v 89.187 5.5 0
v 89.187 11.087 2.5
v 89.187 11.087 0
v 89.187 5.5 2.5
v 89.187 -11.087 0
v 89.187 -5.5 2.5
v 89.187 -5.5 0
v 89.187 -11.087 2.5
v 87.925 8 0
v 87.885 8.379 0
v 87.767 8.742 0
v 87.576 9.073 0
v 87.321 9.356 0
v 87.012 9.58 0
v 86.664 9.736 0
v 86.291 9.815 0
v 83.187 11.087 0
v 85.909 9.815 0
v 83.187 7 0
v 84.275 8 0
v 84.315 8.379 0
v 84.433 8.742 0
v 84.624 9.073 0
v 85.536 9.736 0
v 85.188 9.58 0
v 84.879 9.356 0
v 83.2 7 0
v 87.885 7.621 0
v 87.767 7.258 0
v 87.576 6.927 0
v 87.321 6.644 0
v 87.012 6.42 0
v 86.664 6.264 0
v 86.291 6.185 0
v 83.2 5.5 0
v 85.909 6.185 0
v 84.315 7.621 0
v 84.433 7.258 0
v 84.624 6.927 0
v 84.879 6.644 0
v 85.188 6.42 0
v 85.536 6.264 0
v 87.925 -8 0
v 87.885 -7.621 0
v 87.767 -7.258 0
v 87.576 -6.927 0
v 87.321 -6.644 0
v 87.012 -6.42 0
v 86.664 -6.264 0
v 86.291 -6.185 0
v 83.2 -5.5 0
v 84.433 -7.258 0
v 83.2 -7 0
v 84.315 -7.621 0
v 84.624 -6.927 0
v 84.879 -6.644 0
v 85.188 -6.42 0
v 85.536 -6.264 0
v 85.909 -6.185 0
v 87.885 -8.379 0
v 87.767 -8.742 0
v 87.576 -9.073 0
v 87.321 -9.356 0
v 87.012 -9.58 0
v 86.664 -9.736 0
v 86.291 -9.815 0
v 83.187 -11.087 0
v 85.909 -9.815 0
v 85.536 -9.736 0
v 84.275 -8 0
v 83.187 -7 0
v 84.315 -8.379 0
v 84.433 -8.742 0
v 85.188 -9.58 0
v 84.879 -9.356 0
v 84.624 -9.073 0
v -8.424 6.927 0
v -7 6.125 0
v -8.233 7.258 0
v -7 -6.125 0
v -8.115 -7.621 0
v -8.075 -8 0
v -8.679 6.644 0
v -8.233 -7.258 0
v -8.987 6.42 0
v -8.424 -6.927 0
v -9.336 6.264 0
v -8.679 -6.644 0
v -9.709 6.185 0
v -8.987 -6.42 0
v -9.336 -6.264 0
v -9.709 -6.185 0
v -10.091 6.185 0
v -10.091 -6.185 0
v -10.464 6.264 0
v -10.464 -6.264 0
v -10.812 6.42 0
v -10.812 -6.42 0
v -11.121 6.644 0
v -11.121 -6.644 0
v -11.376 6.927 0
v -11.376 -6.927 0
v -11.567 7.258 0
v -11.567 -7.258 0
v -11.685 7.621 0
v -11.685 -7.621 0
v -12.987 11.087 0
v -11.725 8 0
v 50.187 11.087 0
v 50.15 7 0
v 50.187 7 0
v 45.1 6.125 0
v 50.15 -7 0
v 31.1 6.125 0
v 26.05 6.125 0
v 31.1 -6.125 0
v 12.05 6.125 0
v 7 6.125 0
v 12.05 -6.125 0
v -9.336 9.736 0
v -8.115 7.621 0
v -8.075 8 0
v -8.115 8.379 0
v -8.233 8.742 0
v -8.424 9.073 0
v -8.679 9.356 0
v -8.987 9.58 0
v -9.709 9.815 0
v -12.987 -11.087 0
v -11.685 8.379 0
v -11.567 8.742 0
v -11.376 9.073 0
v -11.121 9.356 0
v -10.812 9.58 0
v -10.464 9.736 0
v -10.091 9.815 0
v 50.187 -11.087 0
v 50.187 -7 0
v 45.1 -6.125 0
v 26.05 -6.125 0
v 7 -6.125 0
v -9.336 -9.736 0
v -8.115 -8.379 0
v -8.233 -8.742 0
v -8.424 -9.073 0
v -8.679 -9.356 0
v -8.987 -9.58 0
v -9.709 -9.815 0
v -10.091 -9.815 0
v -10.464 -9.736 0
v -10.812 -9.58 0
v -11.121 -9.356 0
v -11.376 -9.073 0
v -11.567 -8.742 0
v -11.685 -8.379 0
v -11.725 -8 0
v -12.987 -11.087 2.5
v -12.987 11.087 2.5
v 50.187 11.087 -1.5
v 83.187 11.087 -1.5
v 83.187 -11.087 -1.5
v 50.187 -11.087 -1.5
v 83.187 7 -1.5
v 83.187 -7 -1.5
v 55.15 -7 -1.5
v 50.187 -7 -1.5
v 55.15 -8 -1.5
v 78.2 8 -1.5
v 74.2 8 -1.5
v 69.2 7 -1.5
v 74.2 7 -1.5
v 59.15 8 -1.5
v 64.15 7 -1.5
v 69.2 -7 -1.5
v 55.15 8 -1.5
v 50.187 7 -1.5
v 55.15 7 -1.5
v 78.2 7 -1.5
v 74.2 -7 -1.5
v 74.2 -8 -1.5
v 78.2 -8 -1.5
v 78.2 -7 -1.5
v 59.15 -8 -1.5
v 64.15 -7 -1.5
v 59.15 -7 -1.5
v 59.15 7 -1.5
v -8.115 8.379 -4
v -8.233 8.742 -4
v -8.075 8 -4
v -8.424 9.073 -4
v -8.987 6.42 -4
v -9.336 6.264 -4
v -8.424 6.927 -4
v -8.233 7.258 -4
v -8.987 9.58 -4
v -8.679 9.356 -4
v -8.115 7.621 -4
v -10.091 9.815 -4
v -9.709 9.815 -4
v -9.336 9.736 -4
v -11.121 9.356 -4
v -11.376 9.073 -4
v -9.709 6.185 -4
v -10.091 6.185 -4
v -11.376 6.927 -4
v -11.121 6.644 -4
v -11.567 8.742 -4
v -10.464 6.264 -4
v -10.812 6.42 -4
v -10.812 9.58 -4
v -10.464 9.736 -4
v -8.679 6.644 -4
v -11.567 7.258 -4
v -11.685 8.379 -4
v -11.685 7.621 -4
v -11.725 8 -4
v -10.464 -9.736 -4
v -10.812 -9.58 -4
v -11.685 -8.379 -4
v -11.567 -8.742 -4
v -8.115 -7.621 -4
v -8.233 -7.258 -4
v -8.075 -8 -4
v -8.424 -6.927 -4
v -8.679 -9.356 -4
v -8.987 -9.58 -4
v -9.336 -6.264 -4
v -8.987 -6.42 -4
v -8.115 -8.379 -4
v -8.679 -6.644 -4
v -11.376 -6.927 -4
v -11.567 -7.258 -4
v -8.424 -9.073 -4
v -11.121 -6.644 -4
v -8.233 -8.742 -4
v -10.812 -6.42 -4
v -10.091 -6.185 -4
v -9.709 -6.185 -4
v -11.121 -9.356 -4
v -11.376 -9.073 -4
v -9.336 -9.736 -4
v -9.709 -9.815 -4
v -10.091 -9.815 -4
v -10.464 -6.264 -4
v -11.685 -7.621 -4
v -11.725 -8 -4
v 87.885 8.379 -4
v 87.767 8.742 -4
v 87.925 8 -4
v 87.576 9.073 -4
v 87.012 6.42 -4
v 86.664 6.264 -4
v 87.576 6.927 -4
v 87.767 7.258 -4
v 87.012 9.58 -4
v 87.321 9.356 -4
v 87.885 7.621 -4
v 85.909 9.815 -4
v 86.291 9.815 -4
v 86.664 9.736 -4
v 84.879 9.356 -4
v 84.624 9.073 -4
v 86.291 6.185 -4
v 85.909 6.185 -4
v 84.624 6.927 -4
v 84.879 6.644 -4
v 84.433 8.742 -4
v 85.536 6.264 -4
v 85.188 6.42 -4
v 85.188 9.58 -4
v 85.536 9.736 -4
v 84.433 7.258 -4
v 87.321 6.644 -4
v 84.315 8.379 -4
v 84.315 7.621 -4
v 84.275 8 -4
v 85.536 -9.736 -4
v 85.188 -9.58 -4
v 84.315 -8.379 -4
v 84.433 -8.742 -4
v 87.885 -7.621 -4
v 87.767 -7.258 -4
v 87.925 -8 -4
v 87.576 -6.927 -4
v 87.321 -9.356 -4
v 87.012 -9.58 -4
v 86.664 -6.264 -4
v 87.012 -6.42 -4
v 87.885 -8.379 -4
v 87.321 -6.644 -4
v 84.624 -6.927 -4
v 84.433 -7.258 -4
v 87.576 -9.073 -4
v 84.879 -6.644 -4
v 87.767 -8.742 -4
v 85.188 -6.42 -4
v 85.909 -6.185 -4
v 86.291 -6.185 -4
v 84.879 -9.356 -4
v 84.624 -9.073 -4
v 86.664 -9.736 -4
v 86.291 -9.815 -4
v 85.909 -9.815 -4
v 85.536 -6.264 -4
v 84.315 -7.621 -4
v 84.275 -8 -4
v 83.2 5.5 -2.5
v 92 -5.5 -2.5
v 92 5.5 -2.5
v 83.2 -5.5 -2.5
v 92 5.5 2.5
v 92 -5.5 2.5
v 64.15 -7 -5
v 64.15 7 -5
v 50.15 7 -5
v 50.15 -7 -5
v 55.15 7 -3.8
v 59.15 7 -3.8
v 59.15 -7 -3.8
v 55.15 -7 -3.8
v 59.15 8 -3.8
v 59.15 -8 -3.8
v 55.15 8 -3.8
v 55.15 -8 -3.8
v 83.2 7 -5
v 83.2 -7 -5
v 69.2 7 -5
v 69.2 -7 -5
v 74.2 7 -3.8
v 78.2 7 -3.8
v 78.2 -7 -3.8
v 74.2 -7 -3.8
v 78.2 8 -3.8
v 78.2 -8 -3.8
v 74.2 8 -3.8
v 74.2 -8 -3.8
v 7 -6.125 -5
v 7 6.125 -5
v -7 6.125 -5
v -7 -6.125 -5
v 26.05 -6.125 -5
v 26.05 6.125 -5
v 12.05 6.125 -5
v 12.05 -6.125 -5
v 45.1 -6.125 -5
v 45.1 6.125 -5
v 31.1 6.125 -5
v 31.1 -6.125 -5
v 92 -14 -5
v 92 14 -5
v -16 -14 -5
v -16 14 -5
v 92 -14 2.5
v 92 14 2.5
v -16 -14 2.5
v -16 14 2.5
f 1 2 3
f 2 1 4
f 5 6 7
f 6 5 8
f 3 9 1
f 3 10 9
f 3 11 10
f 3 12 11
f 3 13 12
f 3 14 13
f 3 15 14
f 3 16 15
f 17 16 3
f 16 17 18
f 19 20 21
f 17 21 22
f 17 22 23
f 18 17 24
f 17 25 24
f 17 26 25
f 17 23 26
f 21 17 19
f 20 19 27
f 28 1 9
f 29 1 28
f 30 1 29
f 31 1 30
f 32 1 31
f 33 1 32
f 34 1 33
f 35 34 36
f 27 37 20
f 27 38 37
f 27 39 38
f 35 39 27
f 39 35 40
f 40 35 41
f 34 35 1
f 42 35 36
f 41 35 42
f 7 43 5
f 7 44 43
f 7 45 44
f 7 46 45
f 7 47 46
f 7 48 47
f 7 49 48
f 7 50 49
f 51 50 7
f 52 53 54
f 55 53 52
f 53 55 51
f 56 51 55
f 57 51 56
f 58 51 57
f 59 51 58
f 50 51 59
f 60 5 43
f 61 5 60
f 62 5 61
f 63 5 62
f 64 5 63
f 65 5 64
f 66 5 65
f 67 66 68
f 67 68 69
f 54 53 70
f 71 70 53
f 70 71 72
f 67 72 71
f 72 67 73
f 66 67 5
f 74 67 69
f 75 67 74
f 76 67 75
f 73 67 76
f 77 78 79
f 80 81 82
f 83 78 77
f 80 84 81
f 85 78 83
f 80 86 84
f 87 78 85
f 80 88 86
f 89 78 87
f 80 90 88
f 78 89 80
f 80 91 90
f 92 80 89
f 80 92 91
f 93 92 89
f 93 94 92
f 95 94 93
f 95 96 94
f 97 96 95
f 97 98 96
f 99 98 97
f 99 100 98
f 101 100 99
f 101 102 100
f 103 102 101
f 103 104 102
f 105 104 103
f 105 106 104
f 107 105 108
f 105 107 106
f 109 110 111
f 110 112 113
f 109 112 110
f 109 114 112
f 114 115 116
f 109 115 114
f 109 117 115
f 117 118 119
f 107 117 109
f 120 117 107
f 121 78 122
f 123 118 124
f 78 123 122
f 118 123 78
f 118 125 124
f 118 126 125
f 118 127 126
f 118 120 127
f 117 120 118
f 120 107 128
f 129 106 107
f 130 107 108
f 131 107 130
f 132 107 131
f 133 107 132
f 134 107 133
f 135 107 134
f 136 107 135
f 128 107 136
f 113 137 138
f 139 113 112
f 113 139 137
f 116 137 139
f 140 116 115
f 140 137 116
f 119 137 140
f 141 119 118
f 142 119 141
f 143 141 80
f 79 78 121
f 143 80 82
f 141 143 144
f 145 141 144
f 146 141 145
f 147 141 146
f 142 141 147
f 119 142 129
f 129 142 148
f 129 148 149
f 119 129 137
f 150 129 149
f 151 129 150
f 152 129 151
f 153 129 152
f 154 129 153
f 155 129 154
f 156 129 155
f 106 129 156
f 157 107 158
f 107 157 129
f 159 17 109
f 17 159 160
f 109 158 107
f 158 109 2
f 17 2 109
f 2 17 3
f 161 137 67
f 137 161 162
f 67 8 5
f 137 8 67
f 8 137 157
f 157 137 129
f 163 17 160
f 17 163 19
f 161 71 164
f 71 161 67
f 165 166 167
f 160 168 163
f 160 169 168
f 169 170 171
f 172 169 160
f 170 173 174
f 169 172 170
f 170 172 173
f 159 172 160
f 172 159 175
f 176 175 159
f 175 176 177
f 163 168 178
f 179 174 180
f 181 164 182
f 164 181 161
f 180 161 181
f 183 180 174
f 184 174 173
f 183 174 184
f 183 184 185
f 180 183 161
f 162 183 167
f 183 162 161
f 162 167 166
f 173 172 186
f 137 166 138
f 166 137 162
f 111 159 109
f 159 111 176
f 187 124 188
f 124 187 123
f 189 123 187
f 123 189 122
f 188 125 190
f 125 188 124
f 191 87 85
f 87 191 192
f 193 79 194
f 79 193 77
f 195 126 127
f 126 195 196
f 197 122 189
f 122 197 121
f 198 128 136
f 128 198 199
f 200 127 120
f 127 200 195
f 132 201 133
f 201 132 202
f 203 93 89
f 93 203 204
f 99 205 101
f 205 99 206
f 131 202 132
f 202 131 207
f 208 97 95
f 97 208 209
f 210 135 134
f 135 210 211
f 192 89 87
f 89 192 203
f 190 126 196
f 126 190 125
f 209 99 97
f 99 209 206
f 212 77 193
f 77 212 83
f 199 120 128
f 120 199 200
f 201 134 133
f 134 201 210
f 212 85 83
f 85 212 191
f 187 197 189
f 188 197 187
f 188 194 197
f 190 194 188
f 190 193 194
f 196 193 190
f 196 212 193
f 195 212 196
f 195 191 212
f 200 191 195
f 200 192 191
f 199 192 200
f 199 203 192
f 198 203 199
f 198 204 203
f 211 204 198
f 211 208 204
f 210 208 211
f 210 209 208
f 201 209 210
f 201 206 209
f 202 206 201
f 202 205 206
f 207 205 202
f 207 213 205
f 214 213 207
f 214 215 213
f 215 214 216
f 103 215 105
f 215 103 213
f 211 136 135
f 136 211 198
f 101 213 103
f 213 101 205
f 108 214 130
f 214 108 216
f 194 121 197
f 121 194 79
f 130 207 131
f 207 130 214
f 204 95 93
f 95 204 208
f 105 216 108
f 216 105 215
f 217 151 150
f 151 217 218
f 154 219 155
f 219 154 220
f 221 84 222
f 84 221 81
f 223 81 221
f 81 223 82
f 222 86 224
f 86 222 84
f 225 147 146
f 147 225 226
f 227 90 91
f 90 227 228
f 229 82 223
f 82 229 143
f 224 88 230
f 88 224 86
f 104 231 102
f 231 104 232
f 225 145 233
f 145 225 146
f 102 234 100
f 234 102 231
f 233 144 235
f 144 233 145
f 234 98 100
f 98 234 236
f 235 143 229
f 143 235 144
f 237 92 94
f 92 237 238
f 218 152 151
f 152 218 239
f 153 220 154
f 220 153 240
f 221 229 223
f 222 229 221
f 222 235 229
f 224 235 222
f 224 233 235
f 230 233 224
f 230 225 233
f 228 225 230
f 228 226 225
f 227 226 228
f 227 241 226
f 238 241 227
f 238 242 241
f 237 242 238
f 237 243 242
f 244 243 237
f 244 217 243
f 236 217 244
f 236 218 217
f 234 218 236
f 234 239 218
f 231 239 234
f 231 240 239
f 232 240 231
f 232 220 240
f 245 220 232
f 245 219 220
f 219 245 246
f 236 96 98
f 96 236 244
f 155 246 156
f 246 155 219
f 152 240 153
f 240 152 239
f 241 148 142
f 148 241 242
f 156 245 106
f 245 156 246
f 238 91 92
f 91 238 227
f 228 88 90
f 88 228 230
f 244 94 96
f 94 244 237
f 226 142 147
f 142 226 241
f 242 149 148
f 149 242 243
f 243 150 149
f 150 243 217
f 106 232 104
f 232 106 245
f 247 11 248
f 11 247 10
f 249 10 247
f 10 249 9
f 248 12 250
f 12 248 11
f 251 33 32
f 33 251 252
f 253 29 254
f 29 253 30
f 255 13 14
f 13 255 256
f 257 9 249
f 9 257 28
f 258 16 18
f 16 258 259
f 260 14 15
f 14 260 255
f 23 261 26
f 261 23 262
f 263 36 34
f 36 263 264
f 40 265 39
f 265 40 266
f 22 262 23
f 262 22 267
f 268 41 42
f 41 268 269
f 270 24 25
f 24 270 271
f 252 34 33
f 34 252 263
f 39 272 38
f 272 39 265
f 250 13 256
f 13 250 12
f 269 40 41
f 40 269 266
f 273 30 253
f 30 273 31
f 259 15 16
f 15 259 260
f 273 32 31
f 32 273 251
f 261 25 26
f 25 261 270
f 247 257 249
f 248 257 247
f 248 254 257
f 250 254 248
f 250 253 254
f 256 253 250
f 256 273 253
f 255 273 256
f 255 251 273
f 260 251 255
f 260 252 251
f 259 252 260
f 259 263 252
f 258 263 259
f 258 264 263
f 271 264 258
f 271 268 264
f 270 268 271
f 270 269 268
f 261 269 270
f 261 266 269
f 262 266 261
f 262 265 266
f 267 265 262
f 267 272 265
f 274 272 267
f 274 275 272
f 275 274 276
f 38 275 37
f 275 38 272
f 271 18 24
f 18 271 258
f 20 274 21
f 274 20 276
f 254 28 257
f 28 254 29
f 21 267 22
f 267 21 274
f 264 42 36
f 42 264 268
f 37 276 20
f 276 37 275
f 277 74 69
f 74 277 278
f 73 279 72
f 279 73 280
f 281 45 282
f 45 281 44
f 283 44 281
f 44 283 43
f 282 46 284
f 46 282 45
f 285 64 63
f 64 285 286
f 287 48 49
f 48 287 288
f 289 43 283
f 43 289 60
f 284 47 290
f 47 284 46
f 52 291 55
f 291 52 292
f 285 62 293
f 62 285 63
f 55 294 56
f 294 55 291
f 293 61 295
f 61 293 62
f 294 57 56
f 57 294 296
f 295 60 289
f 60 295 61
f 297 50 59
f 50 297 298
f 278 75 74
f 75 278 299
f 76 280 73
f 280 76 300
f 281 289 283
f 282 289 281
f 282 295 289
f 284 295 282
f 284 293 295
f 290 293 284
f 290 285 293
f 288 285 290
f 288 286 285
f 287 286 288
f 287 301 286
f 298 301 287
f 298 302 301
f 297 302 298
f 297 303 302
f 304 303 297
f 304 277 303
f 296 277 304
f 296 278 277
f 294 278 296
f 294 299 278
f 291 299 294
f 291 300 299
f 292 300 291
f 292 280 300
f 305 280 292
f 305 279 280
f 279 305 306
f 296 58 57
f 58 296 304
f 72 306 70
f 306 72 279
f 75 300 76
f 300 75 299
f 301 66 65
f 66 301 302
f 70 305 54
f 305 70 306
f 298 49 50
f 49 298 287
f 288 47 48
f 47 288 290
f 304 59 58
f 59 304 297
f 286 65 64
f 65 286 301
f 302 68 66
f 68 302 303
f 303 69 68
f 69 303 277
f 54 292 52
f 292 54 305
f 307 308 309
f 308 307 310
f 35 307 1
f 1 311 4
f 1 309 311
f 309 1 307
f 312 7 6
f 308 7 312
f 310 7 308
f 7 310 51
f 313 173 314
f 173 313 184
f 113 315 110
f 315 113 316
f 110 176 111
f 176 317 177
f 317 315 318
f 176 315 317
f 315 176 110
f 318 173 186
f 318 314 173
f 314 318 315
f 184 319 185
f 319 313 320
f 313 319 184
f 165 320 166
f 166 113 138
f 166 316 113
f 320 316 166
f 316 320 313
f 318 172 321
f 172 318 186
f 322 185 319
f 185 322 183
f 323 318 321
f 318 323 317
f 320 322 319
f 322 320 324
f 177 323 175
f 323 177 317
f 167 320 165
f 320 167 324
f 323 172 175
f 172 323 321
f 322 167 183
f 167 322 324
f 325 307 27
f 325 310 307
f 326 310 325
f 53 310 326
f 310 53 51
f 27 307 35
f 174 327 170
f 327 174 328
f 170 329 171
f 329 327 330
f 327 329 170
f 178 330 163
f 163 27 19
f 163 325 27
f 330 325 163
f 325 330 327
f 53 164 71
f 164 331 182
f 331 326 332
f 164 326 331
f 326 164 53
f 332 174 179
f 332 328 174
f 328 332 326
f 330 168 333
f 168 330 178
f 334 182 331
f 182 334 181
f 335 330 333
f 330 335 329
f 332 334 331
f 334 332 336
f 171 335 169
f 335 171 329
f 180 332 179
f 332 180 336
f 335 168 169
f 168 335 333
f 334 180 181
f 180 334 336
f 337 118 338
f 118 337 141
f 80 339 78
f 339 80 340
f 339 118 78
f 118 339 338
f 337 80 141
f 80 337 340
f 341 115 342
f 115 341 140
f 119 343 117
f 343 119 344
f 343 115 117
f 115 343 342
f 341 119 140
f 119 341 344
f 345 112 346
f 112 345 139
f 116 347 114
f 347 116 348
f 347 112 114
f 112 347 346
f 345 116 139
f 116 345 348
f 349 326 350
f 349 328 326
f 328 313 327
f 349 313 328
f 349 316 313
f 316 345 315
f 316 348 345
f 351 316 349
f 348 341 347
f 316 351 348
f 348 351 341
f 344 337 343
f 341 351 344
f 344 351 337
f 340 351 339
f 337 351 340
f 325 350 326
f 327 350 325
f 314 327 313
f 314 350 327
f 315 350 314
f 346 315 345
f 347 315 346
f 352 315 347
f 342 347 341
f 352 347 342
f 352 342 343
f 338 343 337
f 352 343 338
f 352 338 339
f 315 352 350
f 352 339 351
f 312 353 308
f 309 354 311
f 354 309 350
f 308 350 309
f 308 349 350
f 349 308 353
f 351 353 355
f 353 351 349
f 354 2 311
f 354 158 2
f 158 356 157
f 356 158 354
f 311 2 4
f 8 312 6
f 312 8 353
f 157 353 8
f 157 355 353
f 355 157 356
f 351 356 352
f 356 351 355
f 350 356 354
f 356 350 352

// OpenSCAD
/* Notes:
 * - my M2 heat set nuts, the shortest ones, are 3.5mm in diameter and 4mm
 *   long.
 * - stock miniMACRO5 shell leaves 5mm from top face to where the PCB hits
 *   the plastic underneath. Mill-max sockets supposedly take up an additional
 *   0.64mm of space above the board.
 * - rotary encoders only need about 12.25mm in the Y.
 */

$fn=30;

// translate([0,0,-5]) import("./orig/miniMACRO5.stl");
shape();

module shape() {
   difference() {
      simpleBody();
      pcbPlus(height=20);
      switchHoles();
   }
}

//Thickness of entire plate
plateThickness=4.8;
//Unit square length, from Cherry MX data sheet
lkey=19.05;
//Hole size, from Cherry MX data sheet
holesize=14;
//length, in units, of board
width=15;
//Height, in units, of board
height=1;

//calculated vars

holediff=lkey-holesize;
w=width*lkey;
h=height*lkey;

//
// THINGS TO PRINT
//
module miniHoles() {
   mm5 = [
         //start ROW 0
         [[0,0],1,"r"],
         [[1,0],1,"r"],
         [[2,0],1,"r"],
         [[3,0],1,"s"],
         [[4,0],1,"s"],
         ];

   holematrix(mm5,0,h-lkey);
}

module switchhole(size=1,openable=0,switch=1){
    translate([0,0,-0.1]) union(){
        if (switch) {
           cube([holesize,holesize,plateThickness+0.4]);
           translate([holesize/2-2,-1,1.3]) cube([4,holesize+2,plateThickness+0.4 - 1.3]); // for clip to catch
        }
        else {
           translate([0,(holesize-12.25)/2,0])
              cube([holesize, 12.25, plateThickness+0.4]);
        }
    }
}

module holematrix(holes,startx,starty){
    for (key = holes){
        translate([startx+lkey*key[0][0], starty-lkey*key[0][1], 0])
        translate([(lkey*key[1]-holesize)/2,(lkey - holesize)/2, 0])
        switchhole(size=key[1],switch=(key[2] == "s" ? 1 : 0));
    }
}

module pcbPlus(height=1) {
   translate([-12.987,-11.087,0]) cube([12.987+89.187,11.087*2,height]);

   /* cutout to account for solder points for arduino riser */
   translate([89.187-35-4,-11.087,-1.5]) cube([33,11.087*2,height+1.5]);

   /* screws, heat set inserts */
   translate([-9.9,8,-4]) cylinder(d=3.65,h=5);
   translate([-9.9,-8,-4]) cylinder(d=3.65,h=5);
   translate([86.1,8,-4]) cylinder(d=3.65,h=5);
   translate([86.1,-8,-4]) cylinder(d=3.65,h=5);

   /* USB */
   translate([80,-5.5,-2.5]) cube([20,11,10.5]);
}

module simpleBody() {
   translate([0,0,-5]) linear_extrude(height=7.5)
      polygon(points=[[-16,-14],[-16,14],[92,14],[92,-14]]);

}

module switchHoles() {
   translate([-7.15-2.525+0.15,-7.15-2.525+0.15,-5]) miniHoles();
}
